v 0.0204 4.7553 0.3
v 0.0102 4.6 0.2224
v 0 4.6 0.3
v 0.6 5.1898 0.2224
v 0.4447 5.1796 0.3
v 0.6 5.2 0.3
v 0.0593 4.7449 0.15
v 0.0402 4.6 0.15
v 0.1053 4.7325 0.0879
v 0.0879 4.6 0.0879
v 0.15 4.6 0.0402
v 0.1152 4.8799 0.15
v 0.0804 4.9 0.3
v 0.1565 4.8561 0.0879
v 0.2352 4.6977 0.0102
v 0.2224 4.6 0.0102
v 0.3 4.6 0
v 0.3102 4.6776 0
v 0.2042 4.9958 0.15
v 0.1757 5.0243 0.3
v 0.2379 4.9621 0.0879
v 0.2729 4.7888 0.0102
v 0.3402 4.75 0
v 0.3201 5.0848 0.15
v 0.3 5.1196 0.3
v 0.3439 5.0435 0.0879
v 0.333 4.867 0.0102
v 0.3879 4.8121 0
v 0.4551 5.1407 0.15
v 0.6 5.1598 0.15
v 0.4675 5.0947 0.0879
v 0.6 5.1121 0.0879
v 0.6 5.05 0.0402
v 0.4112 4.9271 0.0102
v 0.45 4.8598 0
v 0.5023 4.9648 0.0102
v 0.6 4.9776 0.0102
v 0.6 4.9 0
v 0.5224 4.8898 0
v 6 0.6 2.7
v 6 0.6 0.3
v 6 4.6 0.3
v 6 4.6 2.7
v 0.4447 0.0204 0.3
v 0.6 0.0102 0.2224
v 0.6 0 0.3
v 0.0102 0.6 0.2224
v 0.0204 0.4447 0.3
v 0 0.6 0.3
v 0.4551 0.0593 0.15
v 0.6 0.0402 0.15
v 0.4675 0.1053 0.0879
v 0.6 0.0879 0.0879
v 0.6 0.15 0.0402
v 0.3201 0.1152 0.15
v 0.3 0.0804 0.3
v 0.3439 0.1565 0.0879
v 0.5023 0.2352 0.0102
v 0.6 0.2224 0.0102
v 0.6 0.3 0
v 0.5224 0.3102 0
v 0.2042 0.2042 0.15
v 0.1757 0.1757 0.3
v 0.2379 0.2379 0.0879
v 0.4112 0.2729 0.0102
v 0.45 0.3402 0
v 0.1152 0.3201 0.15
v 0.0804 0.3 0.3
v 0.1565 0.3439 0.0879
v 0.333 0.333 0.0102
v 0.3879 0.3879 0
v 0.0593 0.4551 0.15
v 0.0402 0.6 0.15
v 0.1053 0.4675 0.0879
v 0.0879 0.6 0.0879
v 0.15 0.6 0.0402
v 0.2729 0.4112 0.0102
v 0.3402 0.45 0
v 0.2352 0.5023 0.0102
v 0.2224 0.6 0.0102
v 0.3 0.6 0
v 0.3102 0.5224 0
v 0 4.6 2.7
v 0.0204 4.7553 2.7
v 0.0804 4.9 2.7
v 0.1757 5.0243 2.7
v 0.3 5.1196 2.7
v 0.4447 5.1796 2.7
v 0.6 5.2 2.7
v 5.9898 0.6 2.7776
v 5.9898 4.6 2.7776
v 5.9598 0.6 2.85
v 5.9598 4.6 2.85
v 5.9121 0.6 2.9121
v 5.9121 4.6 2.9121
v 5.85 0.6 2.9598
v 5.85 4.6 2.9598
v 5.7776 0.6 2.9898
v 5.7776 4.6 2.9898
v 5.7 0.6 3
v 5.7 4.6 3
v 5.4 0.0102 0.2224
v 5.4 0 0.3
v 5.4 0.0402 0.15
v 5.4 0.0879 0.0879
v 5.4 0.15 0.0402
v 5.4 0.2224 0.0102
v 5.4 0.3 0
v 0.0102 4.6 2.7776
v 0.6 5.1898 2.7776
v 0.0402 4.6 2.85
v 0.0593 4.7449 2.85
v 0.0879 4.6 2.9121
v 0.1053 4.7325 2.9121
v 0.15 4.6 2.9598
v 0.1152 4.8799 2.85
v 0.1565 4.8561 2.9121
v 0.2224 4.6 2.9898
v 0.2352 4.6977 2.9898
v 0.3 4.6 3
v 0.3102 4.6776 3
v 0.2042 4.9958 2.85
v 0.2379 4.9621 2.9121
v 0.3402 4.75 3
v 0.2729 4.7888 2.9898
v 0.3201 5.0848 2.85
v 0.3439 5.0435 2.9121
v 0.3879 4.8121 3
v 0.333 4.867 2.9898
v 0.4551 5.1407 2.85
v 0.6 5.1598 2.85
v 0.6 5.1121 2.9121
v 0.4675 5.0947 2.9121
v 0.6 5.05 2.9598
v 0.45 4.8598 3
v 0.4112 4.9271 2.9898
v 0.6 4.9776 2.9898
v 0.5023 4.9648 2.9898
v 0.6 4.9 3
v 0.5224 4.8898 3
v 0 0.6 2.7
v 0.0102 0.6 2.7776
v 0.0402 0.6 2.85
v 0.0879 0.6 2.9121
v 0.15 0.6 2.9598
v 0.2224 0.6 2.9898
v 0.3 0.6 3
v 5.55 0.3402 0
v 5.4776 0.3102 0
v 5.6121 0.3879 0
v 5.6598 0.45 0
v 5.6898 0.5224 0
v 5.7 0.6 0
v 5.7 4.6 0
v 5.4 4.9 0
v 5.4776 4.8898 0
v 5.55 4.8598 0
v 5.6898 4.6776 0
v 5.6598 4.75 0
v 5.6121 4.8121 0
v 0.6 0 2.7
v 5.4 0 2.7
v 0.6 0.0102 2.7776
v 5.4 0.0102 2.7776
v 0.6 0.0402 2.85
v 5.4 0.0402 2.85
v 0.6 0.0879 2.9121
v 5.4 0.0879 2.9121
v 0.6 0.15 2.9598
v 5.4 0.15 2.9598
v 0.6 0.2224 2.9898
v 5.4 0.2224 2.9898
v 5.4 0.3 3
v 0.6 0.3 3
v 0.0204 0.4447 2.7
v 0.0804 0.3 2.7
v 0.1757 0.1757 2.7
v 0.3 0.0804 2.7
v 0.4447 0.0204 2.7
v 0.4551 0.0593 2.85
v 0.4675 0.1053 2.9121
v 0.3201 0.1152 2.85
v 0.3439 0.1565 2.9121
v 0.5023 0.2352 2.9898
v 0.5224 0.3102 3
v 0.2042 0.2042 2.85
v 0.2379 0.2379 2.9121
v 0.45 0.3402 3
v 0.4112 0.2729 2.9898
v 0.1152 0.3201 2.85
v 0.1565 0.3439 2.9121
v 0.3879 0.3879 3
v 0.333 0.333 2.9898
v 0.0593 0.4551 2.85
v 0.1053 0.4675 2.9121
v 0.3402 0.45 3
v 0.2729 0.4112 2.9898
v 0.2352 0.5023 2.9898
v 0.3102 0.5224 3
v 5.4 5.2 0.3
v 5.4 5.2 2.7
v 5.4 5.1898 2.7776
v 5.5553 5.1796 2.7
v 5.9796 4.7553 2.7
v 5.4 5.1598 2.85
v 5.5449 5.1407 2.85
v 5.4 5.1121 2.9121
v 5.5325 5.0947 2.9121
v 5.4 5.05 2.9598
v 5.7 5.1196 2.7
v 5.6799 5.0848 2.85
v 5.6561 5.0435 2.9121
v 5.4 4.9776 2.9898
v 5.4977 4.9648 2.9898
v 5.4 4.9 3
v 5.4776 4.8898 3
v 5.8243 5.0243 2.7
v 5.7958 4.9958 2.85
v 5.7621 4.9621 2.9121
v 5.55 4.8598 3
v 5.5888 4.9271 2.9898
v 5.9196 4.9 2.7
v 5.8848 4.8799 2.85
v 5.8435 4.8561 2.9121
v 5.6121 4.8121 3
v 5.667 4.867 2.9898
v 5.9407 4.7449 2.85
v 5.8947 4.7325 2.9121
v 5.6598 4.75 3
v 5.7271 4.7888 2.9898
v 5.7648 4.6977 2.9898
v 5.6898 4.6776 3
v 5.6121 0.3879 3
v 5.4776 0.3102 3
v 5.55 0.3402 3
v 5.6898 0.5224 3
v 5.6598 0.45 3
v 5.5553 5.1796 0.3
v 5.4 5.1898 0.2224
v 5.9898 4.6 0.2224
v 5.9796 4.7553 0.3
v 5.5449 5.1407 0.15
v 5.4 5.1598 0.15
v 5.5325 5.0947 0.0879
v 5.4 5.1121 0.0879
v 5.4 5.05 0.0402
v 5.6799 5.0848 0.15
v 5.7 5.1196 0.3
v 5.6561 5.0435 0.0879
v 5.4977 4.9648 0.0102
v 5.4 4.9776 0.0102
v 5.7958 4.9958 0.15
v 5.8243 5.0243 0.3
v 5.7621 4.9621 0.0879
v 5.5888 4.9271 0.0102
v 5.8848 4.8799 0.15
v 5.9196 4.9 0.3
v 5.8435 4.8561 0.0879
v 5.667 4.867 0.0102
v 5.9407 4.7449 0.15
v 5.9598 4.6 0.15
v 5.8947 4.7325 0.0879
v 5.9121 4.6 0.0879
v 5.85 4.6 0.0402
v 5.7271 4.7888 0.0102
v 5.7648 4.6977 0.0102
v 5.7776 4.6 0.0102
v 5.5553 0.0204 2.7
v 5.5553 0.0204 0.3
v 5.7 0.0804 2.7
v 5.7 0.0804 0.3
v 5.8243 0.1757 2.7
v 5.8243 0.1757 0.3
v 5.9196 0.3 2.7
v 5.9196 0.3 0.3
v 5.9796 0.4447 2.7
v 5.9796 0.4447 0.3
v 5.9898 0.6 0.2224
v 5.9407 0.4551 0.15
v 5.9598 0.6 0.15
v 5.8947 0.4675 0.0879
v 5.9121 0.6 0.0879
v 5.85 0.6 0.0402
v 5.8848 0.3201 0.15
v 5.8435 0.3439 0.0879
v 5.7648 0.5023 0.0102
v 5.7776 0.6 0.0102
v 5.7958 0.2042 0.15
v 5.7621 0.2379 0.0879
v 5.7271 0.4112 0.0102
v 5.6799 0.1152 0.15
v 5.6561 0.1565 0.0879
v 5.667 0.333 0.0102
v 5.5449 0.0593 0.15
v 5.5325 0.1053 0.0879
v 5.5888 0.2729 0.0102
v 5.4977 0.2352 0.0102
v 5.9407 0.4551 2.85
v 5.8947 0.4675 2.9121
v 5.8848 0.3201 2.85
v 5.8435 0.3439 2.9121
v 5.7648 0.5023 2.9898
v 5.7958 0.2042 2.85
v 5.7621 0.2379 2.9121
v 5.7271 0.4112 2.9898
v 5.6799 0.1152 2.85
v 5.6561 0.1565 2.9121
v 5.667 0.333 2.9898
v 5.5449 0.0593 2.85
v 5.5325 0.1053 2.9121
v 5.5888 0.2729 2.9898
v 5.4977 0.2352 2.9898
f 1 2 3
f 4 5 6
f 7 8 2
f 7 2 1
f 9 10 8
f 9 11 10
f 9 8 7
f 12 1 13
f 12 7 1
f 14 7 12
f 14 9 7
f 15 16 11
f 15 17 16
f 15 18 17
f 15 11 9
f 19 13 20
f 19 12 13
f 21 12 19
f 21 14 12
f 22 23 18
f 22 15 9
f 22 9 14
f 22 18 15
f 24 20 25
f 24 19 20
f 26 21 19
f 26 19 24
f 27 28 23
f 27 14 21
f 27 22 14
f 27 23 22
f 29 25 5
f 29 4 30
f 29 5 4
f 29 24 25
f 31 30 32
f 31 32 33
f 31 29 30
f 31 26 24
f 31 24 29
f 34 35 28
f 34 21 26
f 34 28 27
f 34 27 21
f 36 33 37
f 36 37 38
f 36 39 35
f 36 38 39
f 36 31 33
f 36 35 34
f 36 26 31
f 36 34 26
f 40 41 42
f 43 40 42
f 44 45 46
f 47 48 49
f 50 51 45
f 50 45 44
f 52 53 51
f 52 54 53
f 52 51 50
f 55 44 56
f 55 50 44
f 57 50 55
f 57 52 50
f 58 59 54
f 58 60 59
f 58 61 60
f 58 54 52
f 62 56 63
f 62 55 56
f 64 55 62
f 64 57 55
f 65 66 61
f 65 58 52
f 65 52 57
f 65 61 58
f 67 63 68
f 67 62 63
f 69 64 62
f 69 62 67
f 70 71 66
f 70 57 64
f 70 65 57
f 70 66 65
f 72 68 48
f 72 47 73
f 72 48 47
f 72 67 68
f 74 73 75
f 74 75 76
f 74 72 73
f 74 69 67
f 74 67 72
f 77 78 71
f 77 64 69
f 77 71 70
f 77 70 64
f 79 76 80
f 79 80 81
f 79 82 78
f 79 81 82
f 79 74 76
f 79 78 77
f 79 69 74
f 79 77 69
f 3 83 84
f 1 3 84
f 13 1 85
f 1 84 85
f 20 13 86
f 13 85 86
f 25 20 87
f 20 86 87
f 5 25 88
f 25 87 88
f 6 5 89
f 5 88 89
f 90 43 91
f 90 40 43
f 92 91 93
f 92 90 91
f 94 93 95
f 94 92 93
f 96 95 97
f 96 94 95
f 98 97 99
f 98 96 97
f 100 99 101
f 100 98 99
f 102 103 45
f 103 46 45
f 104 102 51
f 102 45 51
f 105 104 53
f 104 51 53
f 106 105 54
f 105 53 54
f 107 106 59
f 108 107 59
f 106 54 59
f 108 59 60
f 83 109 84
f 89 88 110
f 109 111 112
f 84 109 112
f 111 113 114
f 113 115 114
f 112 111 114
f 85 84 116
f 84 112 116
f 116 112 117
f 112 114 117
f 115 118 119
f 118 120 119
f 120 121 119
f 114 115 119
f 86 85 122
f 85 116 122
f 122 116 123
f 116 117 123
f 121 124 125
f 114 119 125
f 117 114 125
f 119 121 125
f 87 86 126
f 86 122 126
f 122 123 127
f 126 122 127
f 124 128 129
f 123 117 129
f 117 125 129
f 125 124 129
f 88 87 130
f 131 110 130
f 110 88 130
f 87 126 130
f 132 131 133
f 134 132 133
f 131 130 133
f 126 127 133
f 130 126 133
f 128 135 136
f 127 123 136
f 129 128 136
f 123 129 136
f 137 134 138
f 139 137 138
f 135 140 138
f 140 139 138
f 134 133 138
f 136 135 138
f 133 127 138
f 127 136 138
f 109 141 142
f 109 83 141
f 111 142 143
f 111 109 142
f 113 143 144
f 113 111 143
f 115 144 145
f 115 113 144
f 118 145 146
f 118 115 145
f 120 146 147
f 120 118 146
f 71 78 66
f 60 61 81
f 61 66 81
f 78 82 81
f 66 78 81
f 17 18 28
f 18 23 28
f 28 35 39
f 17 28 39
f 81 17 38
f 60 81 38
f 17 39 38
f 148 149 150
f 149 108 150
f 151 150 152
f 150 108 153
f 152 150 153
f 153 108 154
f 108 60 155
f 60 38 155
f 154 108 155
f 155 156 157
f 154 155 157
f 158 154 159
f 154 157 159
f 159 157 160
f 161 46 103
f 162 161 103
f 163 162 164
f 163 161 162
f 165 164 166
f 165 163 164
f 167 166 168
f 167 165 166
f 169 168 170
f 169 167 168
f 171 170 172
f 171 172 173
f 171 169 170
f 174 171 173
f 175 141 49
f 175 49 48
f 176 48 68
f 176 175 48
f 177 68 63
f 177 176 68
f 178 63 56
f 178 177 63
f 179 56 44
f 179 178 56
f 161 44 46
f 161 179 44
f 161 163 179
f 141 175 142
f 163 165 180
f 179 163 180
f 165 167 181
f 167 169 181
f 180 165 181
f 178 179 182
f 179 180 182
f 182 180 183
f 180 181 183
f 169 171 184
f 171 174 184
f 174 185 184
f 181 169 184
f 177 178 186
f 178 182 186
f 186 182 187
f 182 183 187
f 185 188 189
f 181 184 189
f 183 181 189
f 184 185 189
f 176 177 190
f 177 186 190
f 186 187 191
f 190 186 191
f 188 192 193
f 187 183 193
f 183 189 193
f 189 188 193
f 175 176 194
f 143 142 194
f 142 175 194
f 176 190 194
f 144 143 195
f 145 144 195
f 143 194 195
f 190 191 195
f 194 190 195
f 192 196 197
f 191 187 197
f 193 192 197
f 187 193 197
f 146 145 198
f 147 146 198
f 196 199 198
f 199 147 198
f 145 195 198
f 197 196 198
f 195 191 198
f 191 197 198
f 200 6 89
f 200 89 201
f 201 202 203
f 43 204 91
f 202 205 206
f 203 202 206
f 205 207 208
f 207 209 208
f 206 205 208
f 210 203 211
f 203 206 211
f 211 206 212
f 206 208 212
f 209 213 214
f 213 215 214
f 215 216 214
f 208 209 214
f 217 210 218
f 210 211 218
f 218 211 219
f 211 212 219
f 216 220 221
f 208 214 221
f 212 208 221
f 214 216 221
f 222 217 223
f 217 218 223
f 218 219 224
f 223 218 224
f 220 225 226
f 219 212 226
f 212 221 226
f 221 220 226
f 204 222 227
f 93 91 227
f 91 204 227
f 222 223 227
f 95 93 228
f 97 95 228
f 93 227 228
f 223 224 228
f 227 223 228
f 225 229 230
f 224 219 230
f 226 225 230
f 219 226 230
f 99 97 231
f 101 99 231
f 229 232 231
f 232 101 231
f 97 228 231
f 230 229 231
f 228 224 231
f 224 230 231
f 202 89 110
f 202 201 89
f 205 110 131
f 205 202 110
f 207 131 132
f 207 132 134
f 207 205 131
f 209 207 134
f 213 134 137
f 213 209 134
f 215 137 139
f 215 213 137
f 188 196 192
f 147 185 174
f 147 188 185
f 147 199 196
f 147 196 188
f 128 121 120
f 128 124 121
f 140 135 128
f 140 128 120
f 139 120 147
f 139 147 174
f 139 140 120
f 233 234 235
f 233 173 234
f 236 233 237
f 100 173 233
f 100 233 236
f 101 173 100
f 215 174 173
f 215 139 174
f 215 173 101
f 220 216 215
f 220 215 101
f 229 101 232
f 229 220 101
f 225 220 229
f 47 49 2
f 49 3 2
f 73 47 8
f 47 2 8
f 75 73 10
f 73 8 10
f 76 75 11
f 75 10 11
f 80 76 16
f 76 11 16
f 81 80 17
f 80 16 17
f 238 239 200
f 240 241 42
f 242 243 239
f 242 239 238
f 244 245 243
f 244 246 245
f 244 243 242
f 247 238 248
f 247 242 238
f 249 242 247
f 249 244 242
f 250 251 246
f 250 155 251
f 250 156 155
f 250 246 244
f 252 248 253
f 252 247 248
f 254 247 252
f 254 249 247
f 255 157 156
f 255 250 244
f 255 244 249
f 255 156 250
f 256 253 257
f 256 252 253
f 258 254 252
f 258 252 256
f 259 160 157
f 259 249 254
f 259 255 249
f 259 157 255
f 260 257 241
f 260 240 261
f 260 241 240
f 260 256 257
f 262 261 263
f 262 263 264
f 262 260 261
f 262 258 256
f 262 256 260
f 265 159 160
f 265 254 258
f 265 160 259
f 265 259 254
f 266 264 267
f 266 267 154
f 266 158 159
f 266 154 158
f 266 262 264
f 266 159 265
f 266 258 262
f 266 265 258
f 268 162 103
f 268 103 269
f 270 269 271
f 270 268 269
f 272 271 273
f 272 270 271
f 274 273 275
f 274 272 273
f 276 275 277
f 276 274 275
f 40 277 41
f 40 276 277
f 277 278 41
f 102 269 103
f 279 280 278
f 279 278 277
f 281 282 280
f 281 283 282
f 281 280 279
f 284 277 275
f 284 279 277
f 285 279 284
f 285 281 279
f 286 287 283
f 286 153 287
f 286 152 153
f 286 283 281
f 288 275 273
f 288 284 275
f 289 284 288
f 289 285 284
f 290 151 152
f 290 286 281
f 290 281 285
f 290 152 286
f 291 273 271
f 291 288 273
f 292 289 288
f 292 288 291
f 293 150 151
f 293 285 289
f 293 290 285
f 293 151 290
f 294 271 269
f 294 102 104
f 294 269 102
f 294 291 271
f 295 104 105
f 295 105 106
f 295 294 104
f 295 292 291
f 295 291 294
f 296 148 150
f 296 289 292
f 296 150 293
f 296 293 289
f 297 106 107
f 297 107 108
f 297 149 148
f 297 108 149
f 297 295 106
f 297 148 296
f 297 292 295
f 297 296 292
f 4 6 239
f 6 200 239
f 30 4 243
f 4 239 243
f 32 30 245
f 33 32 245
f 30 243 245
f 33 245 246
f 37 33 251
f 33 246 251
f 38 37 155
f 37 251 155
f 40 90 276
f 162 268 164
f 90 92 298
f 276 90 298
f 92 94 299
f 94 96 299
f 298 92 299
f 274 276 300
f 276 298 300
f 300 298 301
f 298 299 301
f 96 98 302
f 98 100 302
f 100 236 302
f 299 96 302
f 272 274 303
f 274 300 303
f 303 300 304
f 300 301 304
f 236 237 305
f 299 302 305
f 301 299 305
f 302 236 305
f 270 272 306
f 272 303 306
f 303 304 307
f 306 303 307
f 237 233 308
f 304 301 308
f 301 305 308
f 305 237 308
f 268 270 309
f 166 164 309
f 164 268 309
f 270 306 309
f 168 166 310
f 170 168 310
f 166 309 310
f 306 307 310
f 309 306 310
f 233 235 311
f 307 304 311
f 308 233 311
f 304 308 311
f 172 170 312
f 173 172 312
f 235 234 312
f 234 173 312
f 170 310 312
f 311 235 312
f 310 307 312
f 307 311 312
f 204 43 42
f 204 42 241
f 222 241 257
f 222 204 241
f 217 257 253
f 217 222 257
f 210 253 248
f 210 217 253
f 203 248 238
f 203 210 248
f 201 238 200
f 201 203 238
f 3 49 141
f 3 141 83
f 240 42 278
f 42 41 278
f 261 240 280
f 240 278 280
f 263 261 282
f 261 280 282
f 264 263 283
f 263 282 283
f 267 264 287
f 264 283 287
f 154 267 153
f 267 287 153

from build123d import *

# Parameters (mm, degrees)
F0_W     = 6
F0_H     = 5.2
F1_DEPTH = 3
F2_R     = 0.6
F3_R     = 0.3


with BuildPart() as f1:
    # F0 (on Top) → F1 (new body)
    with BuildSketch(Plane.XY):
        with Locations((3, 2.6)):
            Rectangle(F0_W, F0_H)
    extrude(amount=F1_DEPTH)

    # F2
    f2_edges = [f1.edges().sort_by_distance(p)[0] for p in [
        (6, 5.2, 1.5),
        (6, 0, 1.5),
        (0, 0, 1.5),
        (0, 5.2, 1.5),
    ]]
    fillet(f2_edges, radius=F2_R)

    # F3
    f3_edges = [f1.edges().sort_by_distance(p)[0] for p in [
        (0, 2.6, 3),
        (0.175736, 5.024264, 3),
        (0.175736, 0.175736, 3),
        (3, 5.2, 3),
        (3, 0, 3),
        (5.824264, 5.024264, 3),
        (5.824264, 0.175736, 3),
        (6, 2.6, 3),
        (0, 2.6, 0),
        (0.175736, 5.024264, 0),
        (0.175736, 0.175736, 0),
        (3, 5.2, 0),
        (3, 0, 0),
        (5.824264, 5.024264, 0),
        (5.824264, 0.175736, 0),
        (6, 2.6, 0),
    ]]
    fillet(f3_edges, radius=F3_R)


solid = f1.part
